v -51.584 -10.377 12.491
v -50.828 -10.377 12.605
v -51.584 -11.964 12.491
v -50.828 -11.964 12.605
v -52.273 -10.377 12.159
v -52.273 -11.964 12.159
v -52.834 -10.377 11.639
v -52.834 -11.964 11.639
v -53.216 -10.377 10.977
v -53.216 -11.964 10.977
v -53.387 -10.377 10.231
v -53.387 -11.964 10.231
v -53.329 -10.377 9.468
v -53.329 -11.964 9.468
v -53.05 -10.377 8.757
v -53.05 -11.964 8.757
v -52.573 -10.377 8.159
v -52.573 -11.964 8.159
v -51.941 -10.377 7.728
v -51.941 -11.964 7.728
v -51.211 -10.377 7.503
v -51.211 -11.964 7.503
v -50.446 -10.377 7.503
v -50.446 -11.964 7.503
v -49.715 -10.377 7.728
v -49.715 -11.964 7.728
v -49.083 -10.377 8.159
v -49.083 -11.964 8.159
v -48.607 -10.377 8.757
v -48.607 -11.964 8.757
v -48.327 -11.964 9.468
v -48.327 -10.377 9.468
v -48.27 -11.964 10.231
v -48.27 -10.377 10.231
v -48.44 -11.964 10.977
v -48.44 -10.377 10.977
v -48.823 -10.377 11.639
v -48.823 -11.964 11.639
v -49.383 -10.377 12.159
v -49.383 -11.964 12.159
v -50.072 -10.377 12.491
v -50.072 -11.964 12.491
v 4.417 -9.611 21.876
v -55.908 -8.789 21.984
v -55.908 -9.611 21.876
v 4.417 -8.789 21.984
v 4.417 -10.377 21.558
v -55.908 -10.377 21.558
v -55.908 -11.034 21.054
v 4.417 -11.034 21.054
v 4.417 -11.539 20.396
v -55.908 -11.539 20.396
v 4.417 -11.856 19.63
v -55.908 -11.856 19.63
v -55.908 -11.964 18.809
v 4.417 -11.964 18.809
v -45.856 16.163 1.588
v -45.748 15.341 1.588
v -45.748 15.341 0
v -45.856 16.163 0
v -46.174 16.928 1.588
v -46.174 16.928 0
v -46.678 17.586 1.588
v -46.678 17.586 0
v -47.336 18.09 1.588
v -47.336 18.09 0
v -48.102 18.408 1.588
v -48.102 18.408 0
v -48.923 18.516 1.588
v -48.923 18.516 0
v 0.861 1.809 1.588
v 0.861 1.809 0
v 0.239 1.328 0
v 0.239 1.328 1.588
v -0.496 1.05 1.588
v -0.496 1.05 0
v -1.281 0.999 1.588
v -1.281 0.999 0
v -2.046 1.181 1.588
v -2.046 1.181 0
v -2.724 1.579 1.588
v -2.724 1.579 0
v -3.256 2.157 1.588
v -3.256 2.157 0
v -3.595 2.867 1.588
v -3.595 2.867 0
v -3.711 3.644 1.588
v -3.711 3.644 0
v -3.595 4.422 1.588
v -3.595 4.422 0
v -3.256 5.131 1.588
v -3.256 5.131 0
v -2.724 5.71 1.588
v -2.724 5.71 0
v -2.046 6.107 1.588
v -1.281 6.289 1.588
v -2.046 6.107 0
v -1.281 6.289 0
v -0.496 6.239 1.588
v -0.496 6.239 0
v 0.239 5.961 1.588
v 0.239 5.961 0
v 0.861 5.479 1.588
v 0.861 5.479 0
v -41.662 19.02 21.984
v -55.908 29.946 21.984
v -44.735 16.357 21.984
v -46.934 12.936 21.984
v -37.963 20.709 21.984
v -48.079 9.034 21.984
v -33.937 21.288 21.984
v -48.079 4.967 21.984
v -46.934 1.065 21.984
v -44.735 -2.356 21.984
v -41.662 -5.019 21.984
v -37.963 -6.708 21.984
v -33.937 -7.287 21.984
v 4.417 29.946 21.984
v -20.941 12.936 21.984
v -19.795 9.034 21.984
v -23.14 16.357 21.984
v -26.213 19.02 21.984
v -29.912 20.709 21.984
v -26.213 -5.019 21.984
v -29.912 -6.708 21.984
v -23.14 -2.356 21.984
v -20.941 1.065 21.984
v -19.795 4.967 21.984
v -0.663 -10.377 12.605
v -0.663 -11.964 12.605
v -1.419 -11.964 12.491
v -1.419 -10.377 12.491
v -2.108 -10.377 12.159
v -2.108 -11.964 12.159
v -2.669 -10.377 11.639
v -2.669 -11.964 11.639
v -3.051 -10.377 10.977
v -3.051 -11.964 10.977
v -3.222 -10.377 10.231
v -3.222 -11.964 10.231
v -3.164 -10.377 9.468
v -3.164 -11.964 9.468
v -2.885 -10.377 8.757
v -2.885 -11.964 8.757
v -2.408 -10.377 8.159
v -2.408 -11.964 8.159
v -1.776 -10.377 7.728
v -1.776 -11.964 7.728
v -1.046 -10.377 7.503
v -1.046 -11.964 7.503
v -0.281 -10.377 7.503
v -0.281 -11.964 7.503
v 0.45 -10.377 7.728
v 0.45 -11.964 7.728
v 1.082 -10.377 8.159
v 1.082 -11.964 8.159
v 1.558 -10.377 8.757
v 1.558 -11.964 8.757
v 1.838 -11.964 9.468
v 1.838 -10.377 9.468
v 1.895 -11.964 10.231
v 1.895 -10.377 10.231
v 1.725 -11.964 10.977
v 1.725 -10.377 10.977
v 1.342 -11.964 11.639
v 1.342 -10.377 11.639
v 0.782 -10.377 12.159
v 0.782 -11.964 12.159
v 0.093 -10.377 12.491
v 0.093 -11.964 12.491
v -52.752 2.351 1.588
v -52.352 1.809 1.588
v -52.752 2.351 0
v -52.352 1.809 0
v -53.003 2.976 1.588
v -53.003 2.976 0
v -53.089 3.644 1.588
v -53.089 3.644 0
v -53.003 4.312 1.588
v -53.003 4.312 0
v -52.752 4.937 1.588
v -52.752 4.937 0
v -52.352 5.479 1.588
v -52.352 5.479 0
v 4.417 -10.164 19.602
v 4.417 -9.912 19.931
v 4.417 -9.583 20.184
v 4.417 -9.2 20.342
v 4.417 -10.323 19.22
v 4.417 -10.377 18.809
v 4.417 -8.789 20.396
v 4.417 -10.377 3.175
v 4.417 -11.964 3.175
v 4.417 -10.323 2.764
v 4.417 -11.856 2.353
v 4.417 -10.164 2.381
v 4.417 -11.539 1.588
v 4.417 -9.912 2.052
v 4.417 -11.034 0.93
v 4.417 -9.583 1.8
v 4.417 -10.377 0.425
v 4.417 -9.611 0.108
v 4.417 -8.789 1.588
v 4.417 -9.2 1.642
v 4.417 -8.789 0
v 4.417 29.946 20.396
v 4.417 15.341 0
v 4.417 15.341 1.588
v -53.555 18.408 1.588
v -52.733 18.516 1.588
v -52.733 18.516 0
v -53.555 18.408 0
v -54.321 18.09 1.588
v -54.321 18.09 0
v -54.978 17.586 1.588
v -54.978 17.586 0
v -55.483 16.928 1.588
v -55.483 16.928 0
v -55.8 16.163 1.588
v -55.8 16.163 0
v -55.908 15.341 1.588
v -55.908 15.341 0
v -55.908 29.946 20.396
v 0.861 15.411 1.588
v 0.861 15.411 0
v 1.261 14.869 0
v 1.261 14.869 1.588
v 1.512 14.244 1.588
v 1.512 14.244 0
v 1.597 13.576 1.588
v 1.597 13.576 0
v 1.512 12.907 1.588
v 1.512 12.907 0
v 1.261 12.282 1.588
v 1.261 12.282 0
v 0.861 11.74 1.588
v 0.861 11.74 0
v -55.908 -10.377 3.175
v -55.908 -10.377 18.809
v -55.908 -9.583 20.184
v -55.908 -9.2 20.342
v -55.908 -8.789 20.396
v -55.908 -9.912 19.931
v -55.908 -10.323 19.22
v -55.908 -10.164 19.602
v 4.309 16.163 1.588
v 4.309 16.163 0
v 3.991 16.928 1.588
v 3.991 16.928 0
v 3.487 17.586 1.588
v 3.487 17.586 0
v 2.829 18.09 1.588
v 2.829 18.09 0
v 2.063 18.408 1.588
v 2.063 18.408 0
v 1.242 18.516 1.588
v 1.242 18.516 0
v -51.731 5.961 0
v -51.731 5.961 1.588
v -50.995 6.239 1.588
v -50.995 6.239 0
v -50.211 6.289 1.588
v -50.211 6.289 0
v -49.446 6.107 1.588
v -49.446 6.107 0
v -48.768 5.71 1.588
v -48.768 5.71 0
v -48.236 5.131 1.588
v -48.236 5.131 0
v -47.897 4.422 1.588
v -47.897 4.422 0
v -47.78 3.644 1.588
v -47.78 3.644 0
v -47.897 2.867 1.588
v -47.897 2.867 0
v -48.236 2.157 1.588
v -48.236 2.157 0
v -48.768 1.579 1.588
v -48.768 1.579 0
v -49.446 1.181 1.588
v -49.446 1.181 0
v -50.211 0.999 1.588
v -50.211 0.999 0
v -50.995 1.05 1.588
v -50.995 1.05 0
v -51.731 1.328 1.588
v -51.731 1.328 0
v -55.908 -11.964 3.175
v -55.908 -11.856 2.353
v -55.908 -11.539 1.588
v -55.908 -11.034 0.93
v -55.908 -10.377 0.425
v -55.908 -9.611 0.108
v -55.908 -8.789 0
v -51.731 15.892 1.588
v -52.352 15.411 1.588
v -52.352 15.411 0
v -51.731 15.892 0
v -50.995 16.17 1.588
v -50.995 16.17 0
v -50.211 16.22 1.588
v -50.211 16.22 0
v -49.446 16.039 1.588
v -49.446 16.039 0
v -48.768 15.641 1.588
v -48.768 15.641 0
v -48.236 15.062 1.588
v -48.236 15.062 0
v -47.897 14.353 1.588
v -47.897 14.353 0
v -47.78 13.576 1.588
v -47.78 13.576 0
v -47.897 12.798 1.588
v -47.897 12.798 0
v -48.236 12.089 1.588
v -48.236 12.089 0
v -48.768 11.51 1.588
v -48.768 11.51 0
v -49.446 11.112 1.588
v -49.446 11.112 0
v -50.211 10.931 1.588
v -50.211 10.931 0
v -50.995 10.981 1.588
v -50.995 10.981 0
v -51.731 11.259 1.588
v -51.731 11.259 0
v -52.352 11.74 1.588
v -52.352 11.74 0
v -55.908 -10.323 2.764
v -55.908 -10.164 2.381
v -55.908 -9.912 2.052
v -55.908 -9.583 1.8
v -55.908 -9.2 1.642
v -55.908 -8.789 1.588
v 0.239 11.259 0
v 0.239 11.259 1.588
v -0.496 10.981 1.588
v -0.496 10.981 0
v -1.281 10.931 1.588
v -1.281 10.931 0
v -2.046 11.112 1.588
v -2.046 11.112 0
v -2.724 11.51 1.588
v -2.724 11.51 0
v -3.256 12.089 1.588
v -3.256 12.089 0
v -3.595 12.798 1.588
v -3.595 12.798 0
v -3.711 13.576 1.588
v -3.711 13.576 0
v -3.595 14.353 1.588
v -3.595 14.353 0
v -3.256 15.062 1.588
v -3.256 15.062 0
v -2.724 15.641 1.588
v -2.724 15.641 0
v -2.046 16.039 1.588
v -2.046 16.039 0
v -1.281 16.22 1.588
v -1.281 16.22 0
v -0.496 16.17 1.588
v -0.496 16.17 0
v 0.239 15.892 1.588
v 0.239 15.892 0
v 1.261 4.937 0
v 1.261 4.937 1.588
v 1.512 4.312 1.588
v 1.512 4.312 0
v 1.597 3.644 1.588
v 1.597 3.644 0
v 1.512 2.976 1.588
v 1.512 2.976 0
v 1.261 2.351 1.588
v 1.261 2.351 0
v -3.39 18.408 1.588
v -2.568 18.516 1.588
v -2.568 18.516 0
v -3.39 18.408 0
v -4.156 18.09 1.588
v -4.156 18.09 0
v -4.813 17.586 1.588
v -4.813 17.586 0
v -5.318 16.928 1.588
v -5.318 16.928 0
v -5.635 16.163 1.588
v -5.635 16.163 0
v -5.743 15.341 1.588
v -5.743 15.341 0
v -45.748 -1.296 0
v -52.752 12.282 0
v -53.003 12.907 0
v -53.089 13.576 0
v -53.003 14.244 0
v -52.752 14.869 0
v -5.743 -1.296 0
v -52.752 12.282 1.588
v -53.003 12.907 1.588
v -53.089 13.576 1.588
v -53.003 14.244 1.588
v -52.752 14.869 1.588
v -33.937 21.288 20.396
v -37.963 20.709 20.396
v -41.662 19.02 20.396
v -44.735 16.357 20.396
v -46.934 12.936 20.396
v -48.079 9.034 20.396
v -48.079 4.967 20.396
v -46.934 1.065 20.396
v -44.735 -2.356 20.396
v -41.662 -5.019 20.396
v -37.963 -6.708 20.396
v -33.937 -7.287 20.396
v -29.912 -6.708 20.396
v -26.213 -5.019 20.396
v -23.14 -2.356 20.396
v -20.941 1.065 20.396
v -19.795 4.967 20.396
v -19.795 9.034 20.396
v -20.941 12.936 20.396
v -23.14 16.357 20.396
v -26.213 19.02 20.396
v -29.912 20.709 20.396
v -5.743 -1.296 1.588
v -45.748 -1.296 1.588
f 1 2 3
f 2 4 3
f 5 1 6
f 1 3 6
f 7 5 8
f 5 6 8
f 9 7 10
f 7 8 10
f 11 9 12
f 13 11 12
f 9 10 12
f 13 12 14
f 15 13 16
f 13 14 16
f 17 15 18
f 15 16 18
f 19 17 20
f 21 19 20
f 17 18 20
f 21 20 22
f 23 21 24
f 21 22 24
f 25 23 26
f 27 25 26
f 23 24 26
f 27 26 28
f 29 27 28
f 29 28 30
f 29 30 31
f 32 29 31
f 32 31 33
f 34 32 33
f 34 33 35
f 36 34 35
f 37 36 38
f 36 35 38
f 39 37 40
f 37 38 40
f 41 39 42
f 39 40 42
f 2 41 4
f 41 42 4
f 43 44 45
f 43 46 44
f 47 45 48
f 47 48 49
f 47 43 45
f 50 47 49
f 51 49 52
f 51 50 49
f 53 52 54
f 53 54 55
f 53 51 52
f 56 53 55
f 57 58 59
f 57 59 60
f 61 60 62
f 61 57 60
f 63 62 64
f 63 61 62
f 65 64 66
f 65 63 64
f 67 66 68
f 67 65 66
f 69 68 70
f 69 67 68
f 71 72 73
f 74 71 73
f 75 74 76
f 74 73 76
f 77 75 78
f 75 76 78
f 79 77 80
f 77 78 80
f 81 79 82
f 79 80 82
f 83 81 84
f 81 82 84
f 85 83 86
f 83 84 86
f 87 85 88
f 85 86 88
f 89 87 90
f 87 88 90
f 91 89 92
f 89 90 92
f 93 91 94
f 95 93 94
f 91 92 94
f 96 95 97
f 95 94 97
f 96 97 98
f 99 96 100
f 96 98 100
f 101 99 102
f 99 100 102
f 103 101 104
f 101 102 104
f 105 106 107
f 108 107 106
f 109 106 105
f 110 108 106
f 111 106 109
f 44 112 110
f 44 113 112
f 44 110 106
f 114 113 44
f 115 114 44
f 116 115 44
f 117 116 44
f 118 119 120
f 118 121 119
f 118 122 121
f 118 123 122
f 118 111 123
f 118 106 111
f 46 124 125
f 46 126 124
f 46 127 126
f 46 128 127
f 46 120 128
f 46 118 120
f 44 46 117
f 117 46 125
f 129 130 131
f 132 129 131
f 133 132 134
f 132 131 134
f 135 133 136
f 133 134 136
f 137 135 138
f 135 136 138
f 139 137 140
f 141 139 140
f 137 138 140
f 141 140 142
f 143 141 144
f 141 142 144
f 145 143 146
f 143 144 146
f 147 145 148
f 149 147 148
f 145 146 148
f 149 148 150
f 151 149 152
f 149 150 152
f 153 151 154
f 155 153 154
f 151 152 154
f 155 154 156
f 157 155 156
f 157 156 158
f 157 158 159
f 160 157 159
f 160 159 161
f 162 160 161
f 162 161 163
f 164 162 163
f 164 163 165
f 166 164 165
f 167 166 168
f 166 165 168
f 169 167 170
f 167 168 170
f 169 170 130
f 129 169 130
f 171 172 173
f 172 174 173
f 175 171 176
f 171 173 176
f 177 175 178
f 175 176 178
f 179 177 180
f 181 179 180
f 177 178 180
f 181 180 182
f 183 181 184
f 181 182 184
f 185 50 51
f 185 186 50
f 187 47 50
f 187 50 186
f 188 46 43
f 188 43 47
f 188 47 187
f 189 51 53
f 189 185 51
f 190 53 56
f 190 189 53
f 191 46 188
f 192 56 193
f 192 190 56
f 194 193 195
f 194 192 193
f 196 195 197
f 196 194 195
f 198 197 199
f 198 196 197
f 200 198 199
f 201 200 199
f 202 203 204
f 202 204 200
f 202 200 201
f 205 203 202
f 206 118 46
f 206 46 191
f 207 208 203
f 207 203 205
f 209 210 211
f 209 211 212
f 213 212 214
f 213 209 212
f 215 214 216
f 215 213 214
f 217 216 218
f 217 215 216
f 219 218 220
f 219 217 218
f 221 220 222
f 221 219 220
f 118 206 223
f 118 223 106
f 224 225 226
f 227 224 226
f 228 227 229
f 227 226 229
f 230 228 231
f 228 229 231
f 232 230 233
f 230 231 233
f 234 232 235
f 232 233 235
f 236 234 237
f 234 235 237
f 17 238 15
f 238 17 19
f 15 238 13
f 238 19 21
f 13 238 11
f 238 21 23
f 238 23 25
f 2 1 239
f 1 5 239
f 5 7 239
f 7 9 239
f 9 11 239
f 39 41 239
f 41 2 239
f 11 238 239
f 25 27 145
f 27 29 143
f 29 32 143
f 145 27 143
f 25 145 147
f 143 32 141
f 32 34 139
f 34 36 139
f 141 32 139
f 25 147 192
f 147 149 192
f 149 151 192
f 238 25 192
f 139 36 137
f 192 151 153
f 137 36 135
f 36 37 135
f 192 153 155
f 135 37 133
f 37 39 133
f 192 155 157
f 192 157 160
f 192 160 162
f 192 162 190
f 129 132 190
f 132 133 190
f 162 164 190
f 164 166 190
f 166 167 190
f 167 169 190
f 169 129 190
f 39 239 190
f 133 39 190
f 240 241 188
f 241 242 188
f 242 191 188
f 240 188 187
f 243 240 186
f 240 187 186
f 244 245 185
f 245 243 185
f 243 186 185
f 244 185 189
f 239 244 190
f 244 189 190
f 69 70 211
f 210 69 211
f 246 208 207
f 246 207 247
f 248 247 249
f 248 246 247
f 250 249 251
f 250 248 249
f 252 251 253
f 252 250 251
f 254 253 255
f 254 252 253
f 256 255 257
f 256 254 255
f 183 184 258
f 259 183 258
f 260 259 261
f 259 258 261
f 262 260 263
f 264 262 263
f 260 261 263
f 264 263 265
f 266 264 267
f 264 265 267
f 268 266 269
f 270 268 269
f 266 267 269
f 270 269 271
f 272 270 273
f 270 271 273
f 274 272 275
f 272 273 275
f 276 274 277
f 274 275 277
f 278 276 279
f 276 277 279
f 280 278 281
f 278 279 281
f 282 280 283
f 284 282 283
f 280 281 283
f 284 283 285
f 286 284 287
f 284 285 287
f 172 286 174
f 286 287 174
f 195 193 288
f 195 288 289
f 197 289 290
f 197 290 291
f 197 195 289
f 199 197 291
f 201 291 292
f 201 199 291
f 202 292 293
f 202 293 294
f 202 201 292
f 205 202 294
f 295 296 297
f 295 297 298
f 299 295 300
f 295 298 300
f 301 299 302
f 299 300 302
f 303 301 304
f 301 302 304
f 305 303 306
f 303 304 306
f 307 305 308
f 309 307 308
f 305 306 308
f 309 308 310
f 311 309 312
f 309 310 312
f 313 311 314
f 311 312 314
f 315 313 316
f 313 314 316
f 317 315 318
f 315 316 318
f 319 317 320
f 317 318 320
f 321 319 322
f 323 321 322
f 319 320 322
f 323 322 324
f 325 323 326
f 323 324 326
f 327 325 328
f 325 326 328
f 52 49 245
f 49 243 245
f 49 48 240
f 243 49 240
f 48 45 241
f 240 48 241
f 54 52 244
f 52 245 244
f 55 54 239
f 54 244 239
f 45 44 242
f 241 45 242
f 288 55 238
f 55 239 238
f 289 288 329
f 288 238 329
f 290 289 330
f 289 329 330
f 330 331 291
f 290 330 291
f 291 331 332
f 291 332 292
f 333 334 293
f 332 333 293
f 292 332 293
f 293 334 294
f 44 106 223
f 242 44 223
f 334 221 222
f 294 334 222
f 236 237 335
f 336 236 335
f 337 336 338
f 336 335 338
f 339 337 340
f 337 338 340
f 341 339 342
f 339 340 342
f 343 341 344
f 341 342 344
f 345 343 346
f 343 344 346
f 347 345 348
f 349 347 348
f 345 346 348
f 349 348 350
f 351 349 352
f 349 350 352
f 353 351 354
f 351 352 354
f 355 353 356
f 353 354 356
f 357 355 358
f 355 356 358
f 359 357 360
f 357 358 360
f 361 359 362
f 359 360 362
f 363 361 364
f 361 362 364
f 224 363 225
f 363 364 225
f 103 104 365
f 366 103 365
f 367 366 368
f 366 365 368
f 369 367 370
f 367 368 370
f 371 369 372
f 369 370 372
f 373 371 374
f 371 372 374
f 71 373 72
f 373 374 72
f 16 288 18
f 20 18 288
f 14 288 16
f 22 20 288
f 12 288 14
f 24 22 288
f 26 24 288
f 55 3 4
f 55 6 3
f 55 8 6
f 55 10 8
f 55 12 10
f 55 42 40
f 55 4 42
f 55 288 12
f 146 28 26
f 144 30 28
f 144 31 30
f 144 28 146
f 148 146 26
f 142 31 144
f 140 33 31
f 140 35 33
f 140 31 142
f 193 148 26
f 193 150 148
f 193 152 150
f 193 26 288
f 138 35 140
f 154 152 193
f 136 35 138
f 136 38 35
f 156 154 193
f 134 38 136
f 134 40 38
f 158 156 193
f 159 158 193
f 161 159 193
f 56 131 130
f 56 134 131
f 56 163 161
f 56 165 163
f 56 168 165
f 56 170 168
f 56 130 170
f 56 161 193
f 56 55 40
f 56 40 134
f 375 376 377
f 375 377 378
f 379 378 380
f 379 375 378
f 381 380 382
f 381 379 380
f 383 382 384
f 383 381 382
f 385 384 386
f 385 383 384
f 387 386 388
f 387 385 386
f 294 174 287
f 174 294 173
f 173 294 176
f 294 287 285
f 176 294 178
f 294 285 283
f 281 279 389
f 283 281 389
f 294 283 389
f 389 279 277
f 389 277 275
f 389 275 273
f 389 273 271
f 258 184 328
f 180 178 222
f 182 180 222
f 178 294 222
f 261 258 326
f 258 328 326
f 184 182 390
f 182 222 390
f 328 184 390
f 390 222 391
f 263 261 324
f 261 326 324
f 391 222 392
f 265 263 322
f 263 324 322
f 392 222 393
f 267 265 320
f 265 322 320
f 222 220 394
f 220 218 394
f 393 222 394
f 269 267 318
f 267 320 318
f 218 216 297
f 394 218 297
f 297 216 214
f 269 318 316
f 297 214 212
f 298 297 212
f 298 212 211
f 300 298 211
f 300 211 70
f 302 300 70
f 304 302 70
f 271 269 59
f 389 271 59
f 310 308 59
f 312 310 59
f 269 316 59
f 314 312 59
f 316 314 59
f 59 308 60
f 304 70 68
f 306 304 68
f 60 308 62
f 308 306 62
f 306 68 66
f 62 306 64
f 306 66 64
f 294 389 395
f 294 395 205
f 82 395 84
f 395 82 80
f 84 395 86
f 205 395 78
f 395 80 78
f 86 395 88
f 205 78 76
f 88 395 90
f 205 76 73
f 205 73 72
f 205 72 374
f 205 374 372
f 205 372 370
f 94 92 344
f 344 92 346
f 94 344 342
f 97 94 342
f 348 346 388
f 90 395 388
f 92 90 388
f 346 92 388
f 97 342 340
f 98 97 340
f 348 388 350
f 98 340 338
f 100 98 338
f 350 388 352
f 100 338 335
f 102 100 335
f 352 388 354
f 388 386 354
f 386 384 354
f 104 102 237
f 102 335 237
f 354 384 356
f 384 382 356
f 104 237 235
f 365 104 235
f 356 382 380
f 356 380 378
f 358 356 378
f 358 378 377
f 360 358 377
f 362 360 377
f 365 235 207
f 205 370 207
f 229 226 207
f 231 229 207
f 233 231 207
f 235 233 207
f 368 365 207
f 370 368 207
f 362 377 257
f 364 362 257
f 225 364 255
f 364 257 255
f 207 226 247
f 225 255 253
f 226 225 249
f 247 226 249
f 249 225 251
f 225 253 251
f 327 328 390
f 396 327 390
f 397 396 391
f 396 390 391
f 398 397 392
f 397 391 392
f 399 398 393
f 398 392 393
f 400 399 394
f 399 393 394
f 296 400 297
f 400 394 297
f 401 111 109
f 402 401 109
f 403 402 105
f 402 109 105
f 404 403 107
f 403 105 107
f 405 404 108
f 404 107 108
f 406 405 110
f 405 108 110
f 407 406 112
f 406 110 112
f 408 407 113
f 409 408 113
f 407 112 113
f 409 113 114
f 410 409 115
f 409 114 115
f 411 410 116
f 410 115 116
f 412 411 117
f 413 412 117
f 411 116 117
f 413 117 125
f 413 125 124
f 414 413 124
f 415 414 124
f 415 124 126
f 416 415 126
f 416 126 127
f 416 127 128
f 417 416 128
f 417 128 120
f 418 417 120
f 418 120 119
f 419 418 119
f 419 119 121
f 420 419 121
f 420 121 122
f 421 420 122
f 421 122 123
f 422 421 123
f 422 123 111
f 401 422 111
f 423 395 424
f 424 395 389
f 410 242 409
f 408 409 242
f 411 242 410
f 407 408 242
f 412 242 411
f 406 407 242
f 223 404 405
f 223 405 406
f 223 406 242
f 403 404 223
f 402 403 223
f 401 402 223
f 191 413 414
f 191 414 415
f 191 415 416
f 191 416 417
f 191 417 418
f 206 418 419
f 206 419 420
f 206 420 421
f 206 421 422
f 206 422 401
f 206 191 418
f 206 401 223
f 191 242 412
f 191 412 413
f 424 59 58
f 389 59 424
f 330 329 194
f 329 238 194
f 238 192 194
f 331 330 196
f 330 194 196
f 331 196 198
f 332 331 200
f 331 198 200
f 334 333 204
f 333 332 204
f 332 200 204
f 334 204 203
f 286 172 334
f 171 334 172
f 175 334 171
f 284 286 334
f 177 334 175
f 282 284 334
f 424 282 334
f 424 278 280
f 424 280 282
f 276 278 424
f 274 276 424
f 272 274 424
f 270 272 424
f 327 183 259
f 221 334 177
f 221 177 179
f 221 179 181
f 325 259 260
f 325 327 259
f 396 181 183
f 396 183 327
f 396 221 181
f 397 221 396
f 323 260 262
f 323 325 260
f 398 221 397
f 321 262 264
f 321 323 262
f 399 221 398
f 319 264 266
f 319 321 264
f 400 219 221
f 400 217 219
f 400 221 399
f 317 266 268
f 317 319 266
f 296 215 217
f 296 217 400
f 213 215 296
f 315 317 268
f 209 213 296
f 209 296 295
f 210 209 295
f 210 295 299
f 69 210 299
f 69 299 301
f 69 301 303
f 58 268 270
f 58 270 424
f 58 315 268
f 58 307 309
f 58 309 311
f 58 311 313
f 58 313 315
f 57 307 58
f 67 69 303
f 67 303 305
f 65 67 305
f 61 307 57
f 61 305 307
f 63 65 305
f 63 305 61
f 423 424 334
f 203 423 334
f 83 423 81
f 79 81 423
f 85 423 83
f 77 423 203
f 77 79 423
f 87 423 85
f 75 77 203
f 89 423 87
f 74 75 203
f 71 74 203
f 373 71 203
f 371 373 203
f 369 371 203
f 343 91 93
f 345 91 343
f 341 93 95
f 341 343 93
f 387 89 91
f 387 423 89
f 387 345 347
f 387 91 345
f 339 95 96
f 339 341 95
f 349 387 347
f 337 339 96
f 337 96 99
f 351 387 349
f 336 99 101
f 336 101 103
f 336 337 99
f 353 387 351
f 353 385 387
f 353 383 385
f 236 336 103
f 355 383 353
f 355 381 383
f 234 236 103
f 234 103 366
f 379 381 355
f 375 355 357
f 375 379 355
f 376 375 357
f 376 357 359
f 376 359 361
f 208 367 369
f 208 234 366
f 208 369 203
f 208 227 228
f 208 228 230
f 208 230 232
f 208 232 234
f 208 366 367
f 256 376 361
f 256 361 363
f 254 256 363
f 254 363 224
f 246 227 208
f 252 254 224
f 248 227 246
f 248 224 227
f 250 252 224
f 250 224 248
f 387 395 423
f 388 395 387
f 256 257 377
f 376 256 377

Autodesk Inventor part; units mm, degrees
ref_plane "YZ Plane" through (0, 0, 0) normal (1, 0, 0) x (0, 1, 0)
ref_plane "Work Plane1" through (-25.7458, -64.4152, -12.319) normal (0, -1, 0) x (0, 0, -1)
ref_plane "Work Plane2" through (0, 0, 0) normal (0, 0, 1) x (1, 0, 0)
sketch "Sketch1" plane through (0, 0, 0) normal (0, 0, 1) x (1, 0, 0)
  line L0 (-0.4093, 18.5158) -> (-5.7433, 18.5158) projected
  line L1 (-5.7433, -1.2962) -> (-5.7433, 18.5158) projected
  line L2 (-45.7483, 18.5158) -> (-51.0823, 18.5158) projected
  line L3 (-45.7483, 18.5158) -> (-45.7483, -1.2962) projected
  line L4 (-5.7433, 18.5158) -> (4.4167, 18.5158)
  line L5 (4.4167, 18.5158) -> (4.4167, -11.9642)
  line L6 (-45.7483, 18.5158) -> (-55.9083, 18.5158)
  line L7 (-55.9083, 18.5158) -> (-55.9083, -11.9642)
  line L8 (-55.9083, -11.9642) -> (4.4167, -11.9642)
  line L9 (-5.7433, -1.2962) -> (-45.7483, -1.2962)
  point P0 (0, 0)
  dimension "d0" = 10.16
  dimension "d1" = 30.48
  dimension "d2" = 10.16
extrude "Extrusion1" add sketch "Sketch1" along normal blind 1.5875
fillet "Corner Round1" radius 3.175 4 edges at (4.4167, 18.5158, 0.7937) (-5.7433, 18.5158, 0.7937) (-45.7483, 18.5158, 0.7937) (-55.9083, 18.5158, 0.7937)
sketch "Sketch2" plane through (4.4167, -10.3767, 0) normal (0, -1, 0) x (1, 0, 0)
  line L0 (-60.325, 0) -> (0, 0)
  line L1 (0, 0) -> (0, 16.9037)
  line L2 (0, 16.9037) -> (-60.325, 16.9037)
  line L3 (-60.325, 16.9037) -> (-60.325, 0)
edge flange "Flange1" height 16.9037 angle 90 thickness 1.5875 bend radius 1.5875 thickness toward (0, -1, 0) relief straight relief width 1.5875 relief depth 0.7937 edges at (-25.7458, -11.9642, 1.5875) wall of the first edge with corners at (-55.9083, -10.3767, 0) (4.4167, -10.3767, 0) (4.4167, -10.3767, 16.9037) (-55.9083, -10.3767, 16.9037)
bend "Bend1"
corner "Corner1"
sketch "Sketch4" plane through (0, 0, 0) normal (0, 0, -1) x (-1, 0, 0)
  arc A0 (-0.8607, 1.809) -> (-0.8607, 5.4793) centre (1.057, 3.6441) ccw projected
  arc A1 (-0.8607, 11.7404) -> (-0.8607, 15.4107) centre (1.057, 13.5755) ccw projected
  arc A2 (52.3523, 15.4107) -> (52.3523, 11.7404) centre (50.4346, 13.5755) ccw projected
  arc A3 (52.3523, 5.4793) -> (52.3523, 1.809) centre (50.4346, 3.6441) ccw projected
  arc A4 (52.3523, 1.809) -> (52.3523, 5.4793) centre (50.4346, 3.6441) ccw
  arc A5 (52.3523, 11.7404) -> (52.3523, 15.4107) centre (50.4346, 13.5755) ccw
  arc A6 (-0.8607, 5.4793) -> (-0.8607, 1.809) centre (1.057, 3.6441) ccw
  arc A7 (-0.8607, 15.4107) -> (-0.8607, 11.7404) centre (1.057, 13.5755) ccw
  point P0 (0, 0)
extrude "Extrusion2" cut sketch "Sketch4" against normal up to surface (1.5875 mm away)
ref_plane "Work Plane4" through (4.4167, -10.3767, 3.175) normal (0, 1, 0) x (1, 0, 0)
sketch "Sketch8" plane through (4.4167, -10.3767, 3.175) normal (0, 1, 0) x (1, 0, 0)
  line L0 (12.7, -13.7287) -> (-73.025, -13.7287) projected
  line L1 (0, 0) -> (-0.1034, -13.7287)
  line L2 (-60.325, 0) -> (0, 0) projected
  line L3 (-60.325, 0) -> (-60.325, -13.7287)
  line L4 (-3.175, 1.5875) -> (-6.985, 1.5875) projected
  line L5 (-5.08, 1.5875) -> (-5.08, -6.8643)
  line L6 (-5.08, -6.8643) -> (0, -6.8644)
  line L7 (0, -13.7287) -> (0, 0) projected
  line L8 (-53.34, 1.5875) -> (-57.15, 1.5875) projected
  line L9 (-55.245, 1.5875) -> (-55.245, -6.8644)
  point P0 (-4.4167, 3.175)
ref_plane "Work Plane3" through (4.4167, -11.9642, 3.175) normal (0, -1, 0) x (1, 0, 0)
sketch "Sketch9" plane through (4.4167, -11.9642, 3.175) normal (0, -1, 0) x (1, 0, 0)
  line L0 (12.7, 13.7287) -> (-73.025, 13.7287) projected
  line L1 (0, 13.7287) -> (-60.325, 13.7287)
  line L2 (-60.325, 13.7287) -> (-60.325, 18.8087)
  line L3 (-60.325, 18.8087) -> (0, 18.8087)
  line L4 (0, 18.8087) -> (0, 13.7287)
  line L5 (-60.325, 13.7287) -> (-60.325, 0) projected
  line L6 (0, 13.7287) -> (0, 0) projected
  point P0 (-4.4167, -3.175)
  dimension "d57" = 5.08
extrude "Extrusion6" add sketch "Sketch9" against normal blind 1.5875
sketch "Sketch11" plane through (4.4167, -11.9642, 20.3962) normal (0, 0, 1) x (1, 0, 0)
  line L0 (-60.325, 0) -> (0, 0)
  line L1 (0, 0) -> (0, 41.91)
  line L2 (0, 41.91) -> (-60.325, 41.91)
  line L3 (-60.325, 41.91) -> (-60.325, 0)
edge flange "Flange4" height 41.91 angle 90 thickness 1.5875 bend radius 1.5875 thickness toward (0, 0, 1) relief straight relief width 1.5875 relief depth 0.7937 edges at (-25.7458, -10.3767, 21.9837) wall of the first edge with corners at (-55.9083, -11.9642, 20.3962) (4.4167, -11.9642, 20.3962) (4.4167, 29.9458, 20.3962) (-55.9083, 29.9458, 20.3962)
bend "Bend4"
corner "Corner4"
hole "Hole1" at (-0.6633, -10.3767, 10.0393) at (-50.8283, -10.3767, 10.0393) direction (0, -1, 0) diameter 5.1308 end through all
sketch "Sketch12" plane through (4.4167, 29.9458, 20.3962) normal (0, 0, -1) x (-1, 0, 0)
  line L0 (38.354, 0.0162) -> (38.354, -22.9454)
  line L1 (60.325, 0) -> (60.325, -38.735) projected
  point P0 (4.4167, -29.9458)
  dimension "d65" = 22.9616
  dimension "d66" = 21.971
hole "Hole2" at (-33.9373, 7.0004, 20.3962) direction (0, 0, 1) diameter 28.575 end through all
equation "\"d63\" = Thickness"
equation "\"d72\" = Thickness"
equation "\"d6\" = BendReliefWidth"
equation "\"d7\" = BendReliefDepth"
equation "\"d8\" = MinimumRemnant"
equation "\"d9\" = BendRadius"
equation "\"d12\" = BendRadius"
equation "\"d13\" = CornerReliefSize"
equation "\"d14\" = GapSize"
equation "\"d15\" = JacobiRadiusSize"
equation "\"d47\" = BendReliefWidth"
equation "\"d48\" = BendReliefDepth"
equation "\"d49\" = MinimumRemnant"
equation "\"d50\" = BendRadius"
equation "\"d53\" = BendRadius"
equation "\"d54\" = CornerReliefSize"
equation "\"d55\" = GapSize"
equation "\"d56\" = JacobiRadiusSize"
equation "\"BendRadius\" = Thickness"
equation "\"BendReliefWidth\" = Thickness"
equation "\"BendReliefDepth\" = 0.5 * Thickness"
equation "\"CornerReliefSize\" = 4 * Thickness"
equation "\"MinimumRemnant\" = 2 * Thickness"
equation "\"TransitionRadius\" = BendRadius"
equation "\"JacobiRadiusSize\" = Thickness"
equation "\"GapSize\" = Thickness"
equation "\"Thickness\" = 1.5875"
properties part number "HSmountLEFT"
